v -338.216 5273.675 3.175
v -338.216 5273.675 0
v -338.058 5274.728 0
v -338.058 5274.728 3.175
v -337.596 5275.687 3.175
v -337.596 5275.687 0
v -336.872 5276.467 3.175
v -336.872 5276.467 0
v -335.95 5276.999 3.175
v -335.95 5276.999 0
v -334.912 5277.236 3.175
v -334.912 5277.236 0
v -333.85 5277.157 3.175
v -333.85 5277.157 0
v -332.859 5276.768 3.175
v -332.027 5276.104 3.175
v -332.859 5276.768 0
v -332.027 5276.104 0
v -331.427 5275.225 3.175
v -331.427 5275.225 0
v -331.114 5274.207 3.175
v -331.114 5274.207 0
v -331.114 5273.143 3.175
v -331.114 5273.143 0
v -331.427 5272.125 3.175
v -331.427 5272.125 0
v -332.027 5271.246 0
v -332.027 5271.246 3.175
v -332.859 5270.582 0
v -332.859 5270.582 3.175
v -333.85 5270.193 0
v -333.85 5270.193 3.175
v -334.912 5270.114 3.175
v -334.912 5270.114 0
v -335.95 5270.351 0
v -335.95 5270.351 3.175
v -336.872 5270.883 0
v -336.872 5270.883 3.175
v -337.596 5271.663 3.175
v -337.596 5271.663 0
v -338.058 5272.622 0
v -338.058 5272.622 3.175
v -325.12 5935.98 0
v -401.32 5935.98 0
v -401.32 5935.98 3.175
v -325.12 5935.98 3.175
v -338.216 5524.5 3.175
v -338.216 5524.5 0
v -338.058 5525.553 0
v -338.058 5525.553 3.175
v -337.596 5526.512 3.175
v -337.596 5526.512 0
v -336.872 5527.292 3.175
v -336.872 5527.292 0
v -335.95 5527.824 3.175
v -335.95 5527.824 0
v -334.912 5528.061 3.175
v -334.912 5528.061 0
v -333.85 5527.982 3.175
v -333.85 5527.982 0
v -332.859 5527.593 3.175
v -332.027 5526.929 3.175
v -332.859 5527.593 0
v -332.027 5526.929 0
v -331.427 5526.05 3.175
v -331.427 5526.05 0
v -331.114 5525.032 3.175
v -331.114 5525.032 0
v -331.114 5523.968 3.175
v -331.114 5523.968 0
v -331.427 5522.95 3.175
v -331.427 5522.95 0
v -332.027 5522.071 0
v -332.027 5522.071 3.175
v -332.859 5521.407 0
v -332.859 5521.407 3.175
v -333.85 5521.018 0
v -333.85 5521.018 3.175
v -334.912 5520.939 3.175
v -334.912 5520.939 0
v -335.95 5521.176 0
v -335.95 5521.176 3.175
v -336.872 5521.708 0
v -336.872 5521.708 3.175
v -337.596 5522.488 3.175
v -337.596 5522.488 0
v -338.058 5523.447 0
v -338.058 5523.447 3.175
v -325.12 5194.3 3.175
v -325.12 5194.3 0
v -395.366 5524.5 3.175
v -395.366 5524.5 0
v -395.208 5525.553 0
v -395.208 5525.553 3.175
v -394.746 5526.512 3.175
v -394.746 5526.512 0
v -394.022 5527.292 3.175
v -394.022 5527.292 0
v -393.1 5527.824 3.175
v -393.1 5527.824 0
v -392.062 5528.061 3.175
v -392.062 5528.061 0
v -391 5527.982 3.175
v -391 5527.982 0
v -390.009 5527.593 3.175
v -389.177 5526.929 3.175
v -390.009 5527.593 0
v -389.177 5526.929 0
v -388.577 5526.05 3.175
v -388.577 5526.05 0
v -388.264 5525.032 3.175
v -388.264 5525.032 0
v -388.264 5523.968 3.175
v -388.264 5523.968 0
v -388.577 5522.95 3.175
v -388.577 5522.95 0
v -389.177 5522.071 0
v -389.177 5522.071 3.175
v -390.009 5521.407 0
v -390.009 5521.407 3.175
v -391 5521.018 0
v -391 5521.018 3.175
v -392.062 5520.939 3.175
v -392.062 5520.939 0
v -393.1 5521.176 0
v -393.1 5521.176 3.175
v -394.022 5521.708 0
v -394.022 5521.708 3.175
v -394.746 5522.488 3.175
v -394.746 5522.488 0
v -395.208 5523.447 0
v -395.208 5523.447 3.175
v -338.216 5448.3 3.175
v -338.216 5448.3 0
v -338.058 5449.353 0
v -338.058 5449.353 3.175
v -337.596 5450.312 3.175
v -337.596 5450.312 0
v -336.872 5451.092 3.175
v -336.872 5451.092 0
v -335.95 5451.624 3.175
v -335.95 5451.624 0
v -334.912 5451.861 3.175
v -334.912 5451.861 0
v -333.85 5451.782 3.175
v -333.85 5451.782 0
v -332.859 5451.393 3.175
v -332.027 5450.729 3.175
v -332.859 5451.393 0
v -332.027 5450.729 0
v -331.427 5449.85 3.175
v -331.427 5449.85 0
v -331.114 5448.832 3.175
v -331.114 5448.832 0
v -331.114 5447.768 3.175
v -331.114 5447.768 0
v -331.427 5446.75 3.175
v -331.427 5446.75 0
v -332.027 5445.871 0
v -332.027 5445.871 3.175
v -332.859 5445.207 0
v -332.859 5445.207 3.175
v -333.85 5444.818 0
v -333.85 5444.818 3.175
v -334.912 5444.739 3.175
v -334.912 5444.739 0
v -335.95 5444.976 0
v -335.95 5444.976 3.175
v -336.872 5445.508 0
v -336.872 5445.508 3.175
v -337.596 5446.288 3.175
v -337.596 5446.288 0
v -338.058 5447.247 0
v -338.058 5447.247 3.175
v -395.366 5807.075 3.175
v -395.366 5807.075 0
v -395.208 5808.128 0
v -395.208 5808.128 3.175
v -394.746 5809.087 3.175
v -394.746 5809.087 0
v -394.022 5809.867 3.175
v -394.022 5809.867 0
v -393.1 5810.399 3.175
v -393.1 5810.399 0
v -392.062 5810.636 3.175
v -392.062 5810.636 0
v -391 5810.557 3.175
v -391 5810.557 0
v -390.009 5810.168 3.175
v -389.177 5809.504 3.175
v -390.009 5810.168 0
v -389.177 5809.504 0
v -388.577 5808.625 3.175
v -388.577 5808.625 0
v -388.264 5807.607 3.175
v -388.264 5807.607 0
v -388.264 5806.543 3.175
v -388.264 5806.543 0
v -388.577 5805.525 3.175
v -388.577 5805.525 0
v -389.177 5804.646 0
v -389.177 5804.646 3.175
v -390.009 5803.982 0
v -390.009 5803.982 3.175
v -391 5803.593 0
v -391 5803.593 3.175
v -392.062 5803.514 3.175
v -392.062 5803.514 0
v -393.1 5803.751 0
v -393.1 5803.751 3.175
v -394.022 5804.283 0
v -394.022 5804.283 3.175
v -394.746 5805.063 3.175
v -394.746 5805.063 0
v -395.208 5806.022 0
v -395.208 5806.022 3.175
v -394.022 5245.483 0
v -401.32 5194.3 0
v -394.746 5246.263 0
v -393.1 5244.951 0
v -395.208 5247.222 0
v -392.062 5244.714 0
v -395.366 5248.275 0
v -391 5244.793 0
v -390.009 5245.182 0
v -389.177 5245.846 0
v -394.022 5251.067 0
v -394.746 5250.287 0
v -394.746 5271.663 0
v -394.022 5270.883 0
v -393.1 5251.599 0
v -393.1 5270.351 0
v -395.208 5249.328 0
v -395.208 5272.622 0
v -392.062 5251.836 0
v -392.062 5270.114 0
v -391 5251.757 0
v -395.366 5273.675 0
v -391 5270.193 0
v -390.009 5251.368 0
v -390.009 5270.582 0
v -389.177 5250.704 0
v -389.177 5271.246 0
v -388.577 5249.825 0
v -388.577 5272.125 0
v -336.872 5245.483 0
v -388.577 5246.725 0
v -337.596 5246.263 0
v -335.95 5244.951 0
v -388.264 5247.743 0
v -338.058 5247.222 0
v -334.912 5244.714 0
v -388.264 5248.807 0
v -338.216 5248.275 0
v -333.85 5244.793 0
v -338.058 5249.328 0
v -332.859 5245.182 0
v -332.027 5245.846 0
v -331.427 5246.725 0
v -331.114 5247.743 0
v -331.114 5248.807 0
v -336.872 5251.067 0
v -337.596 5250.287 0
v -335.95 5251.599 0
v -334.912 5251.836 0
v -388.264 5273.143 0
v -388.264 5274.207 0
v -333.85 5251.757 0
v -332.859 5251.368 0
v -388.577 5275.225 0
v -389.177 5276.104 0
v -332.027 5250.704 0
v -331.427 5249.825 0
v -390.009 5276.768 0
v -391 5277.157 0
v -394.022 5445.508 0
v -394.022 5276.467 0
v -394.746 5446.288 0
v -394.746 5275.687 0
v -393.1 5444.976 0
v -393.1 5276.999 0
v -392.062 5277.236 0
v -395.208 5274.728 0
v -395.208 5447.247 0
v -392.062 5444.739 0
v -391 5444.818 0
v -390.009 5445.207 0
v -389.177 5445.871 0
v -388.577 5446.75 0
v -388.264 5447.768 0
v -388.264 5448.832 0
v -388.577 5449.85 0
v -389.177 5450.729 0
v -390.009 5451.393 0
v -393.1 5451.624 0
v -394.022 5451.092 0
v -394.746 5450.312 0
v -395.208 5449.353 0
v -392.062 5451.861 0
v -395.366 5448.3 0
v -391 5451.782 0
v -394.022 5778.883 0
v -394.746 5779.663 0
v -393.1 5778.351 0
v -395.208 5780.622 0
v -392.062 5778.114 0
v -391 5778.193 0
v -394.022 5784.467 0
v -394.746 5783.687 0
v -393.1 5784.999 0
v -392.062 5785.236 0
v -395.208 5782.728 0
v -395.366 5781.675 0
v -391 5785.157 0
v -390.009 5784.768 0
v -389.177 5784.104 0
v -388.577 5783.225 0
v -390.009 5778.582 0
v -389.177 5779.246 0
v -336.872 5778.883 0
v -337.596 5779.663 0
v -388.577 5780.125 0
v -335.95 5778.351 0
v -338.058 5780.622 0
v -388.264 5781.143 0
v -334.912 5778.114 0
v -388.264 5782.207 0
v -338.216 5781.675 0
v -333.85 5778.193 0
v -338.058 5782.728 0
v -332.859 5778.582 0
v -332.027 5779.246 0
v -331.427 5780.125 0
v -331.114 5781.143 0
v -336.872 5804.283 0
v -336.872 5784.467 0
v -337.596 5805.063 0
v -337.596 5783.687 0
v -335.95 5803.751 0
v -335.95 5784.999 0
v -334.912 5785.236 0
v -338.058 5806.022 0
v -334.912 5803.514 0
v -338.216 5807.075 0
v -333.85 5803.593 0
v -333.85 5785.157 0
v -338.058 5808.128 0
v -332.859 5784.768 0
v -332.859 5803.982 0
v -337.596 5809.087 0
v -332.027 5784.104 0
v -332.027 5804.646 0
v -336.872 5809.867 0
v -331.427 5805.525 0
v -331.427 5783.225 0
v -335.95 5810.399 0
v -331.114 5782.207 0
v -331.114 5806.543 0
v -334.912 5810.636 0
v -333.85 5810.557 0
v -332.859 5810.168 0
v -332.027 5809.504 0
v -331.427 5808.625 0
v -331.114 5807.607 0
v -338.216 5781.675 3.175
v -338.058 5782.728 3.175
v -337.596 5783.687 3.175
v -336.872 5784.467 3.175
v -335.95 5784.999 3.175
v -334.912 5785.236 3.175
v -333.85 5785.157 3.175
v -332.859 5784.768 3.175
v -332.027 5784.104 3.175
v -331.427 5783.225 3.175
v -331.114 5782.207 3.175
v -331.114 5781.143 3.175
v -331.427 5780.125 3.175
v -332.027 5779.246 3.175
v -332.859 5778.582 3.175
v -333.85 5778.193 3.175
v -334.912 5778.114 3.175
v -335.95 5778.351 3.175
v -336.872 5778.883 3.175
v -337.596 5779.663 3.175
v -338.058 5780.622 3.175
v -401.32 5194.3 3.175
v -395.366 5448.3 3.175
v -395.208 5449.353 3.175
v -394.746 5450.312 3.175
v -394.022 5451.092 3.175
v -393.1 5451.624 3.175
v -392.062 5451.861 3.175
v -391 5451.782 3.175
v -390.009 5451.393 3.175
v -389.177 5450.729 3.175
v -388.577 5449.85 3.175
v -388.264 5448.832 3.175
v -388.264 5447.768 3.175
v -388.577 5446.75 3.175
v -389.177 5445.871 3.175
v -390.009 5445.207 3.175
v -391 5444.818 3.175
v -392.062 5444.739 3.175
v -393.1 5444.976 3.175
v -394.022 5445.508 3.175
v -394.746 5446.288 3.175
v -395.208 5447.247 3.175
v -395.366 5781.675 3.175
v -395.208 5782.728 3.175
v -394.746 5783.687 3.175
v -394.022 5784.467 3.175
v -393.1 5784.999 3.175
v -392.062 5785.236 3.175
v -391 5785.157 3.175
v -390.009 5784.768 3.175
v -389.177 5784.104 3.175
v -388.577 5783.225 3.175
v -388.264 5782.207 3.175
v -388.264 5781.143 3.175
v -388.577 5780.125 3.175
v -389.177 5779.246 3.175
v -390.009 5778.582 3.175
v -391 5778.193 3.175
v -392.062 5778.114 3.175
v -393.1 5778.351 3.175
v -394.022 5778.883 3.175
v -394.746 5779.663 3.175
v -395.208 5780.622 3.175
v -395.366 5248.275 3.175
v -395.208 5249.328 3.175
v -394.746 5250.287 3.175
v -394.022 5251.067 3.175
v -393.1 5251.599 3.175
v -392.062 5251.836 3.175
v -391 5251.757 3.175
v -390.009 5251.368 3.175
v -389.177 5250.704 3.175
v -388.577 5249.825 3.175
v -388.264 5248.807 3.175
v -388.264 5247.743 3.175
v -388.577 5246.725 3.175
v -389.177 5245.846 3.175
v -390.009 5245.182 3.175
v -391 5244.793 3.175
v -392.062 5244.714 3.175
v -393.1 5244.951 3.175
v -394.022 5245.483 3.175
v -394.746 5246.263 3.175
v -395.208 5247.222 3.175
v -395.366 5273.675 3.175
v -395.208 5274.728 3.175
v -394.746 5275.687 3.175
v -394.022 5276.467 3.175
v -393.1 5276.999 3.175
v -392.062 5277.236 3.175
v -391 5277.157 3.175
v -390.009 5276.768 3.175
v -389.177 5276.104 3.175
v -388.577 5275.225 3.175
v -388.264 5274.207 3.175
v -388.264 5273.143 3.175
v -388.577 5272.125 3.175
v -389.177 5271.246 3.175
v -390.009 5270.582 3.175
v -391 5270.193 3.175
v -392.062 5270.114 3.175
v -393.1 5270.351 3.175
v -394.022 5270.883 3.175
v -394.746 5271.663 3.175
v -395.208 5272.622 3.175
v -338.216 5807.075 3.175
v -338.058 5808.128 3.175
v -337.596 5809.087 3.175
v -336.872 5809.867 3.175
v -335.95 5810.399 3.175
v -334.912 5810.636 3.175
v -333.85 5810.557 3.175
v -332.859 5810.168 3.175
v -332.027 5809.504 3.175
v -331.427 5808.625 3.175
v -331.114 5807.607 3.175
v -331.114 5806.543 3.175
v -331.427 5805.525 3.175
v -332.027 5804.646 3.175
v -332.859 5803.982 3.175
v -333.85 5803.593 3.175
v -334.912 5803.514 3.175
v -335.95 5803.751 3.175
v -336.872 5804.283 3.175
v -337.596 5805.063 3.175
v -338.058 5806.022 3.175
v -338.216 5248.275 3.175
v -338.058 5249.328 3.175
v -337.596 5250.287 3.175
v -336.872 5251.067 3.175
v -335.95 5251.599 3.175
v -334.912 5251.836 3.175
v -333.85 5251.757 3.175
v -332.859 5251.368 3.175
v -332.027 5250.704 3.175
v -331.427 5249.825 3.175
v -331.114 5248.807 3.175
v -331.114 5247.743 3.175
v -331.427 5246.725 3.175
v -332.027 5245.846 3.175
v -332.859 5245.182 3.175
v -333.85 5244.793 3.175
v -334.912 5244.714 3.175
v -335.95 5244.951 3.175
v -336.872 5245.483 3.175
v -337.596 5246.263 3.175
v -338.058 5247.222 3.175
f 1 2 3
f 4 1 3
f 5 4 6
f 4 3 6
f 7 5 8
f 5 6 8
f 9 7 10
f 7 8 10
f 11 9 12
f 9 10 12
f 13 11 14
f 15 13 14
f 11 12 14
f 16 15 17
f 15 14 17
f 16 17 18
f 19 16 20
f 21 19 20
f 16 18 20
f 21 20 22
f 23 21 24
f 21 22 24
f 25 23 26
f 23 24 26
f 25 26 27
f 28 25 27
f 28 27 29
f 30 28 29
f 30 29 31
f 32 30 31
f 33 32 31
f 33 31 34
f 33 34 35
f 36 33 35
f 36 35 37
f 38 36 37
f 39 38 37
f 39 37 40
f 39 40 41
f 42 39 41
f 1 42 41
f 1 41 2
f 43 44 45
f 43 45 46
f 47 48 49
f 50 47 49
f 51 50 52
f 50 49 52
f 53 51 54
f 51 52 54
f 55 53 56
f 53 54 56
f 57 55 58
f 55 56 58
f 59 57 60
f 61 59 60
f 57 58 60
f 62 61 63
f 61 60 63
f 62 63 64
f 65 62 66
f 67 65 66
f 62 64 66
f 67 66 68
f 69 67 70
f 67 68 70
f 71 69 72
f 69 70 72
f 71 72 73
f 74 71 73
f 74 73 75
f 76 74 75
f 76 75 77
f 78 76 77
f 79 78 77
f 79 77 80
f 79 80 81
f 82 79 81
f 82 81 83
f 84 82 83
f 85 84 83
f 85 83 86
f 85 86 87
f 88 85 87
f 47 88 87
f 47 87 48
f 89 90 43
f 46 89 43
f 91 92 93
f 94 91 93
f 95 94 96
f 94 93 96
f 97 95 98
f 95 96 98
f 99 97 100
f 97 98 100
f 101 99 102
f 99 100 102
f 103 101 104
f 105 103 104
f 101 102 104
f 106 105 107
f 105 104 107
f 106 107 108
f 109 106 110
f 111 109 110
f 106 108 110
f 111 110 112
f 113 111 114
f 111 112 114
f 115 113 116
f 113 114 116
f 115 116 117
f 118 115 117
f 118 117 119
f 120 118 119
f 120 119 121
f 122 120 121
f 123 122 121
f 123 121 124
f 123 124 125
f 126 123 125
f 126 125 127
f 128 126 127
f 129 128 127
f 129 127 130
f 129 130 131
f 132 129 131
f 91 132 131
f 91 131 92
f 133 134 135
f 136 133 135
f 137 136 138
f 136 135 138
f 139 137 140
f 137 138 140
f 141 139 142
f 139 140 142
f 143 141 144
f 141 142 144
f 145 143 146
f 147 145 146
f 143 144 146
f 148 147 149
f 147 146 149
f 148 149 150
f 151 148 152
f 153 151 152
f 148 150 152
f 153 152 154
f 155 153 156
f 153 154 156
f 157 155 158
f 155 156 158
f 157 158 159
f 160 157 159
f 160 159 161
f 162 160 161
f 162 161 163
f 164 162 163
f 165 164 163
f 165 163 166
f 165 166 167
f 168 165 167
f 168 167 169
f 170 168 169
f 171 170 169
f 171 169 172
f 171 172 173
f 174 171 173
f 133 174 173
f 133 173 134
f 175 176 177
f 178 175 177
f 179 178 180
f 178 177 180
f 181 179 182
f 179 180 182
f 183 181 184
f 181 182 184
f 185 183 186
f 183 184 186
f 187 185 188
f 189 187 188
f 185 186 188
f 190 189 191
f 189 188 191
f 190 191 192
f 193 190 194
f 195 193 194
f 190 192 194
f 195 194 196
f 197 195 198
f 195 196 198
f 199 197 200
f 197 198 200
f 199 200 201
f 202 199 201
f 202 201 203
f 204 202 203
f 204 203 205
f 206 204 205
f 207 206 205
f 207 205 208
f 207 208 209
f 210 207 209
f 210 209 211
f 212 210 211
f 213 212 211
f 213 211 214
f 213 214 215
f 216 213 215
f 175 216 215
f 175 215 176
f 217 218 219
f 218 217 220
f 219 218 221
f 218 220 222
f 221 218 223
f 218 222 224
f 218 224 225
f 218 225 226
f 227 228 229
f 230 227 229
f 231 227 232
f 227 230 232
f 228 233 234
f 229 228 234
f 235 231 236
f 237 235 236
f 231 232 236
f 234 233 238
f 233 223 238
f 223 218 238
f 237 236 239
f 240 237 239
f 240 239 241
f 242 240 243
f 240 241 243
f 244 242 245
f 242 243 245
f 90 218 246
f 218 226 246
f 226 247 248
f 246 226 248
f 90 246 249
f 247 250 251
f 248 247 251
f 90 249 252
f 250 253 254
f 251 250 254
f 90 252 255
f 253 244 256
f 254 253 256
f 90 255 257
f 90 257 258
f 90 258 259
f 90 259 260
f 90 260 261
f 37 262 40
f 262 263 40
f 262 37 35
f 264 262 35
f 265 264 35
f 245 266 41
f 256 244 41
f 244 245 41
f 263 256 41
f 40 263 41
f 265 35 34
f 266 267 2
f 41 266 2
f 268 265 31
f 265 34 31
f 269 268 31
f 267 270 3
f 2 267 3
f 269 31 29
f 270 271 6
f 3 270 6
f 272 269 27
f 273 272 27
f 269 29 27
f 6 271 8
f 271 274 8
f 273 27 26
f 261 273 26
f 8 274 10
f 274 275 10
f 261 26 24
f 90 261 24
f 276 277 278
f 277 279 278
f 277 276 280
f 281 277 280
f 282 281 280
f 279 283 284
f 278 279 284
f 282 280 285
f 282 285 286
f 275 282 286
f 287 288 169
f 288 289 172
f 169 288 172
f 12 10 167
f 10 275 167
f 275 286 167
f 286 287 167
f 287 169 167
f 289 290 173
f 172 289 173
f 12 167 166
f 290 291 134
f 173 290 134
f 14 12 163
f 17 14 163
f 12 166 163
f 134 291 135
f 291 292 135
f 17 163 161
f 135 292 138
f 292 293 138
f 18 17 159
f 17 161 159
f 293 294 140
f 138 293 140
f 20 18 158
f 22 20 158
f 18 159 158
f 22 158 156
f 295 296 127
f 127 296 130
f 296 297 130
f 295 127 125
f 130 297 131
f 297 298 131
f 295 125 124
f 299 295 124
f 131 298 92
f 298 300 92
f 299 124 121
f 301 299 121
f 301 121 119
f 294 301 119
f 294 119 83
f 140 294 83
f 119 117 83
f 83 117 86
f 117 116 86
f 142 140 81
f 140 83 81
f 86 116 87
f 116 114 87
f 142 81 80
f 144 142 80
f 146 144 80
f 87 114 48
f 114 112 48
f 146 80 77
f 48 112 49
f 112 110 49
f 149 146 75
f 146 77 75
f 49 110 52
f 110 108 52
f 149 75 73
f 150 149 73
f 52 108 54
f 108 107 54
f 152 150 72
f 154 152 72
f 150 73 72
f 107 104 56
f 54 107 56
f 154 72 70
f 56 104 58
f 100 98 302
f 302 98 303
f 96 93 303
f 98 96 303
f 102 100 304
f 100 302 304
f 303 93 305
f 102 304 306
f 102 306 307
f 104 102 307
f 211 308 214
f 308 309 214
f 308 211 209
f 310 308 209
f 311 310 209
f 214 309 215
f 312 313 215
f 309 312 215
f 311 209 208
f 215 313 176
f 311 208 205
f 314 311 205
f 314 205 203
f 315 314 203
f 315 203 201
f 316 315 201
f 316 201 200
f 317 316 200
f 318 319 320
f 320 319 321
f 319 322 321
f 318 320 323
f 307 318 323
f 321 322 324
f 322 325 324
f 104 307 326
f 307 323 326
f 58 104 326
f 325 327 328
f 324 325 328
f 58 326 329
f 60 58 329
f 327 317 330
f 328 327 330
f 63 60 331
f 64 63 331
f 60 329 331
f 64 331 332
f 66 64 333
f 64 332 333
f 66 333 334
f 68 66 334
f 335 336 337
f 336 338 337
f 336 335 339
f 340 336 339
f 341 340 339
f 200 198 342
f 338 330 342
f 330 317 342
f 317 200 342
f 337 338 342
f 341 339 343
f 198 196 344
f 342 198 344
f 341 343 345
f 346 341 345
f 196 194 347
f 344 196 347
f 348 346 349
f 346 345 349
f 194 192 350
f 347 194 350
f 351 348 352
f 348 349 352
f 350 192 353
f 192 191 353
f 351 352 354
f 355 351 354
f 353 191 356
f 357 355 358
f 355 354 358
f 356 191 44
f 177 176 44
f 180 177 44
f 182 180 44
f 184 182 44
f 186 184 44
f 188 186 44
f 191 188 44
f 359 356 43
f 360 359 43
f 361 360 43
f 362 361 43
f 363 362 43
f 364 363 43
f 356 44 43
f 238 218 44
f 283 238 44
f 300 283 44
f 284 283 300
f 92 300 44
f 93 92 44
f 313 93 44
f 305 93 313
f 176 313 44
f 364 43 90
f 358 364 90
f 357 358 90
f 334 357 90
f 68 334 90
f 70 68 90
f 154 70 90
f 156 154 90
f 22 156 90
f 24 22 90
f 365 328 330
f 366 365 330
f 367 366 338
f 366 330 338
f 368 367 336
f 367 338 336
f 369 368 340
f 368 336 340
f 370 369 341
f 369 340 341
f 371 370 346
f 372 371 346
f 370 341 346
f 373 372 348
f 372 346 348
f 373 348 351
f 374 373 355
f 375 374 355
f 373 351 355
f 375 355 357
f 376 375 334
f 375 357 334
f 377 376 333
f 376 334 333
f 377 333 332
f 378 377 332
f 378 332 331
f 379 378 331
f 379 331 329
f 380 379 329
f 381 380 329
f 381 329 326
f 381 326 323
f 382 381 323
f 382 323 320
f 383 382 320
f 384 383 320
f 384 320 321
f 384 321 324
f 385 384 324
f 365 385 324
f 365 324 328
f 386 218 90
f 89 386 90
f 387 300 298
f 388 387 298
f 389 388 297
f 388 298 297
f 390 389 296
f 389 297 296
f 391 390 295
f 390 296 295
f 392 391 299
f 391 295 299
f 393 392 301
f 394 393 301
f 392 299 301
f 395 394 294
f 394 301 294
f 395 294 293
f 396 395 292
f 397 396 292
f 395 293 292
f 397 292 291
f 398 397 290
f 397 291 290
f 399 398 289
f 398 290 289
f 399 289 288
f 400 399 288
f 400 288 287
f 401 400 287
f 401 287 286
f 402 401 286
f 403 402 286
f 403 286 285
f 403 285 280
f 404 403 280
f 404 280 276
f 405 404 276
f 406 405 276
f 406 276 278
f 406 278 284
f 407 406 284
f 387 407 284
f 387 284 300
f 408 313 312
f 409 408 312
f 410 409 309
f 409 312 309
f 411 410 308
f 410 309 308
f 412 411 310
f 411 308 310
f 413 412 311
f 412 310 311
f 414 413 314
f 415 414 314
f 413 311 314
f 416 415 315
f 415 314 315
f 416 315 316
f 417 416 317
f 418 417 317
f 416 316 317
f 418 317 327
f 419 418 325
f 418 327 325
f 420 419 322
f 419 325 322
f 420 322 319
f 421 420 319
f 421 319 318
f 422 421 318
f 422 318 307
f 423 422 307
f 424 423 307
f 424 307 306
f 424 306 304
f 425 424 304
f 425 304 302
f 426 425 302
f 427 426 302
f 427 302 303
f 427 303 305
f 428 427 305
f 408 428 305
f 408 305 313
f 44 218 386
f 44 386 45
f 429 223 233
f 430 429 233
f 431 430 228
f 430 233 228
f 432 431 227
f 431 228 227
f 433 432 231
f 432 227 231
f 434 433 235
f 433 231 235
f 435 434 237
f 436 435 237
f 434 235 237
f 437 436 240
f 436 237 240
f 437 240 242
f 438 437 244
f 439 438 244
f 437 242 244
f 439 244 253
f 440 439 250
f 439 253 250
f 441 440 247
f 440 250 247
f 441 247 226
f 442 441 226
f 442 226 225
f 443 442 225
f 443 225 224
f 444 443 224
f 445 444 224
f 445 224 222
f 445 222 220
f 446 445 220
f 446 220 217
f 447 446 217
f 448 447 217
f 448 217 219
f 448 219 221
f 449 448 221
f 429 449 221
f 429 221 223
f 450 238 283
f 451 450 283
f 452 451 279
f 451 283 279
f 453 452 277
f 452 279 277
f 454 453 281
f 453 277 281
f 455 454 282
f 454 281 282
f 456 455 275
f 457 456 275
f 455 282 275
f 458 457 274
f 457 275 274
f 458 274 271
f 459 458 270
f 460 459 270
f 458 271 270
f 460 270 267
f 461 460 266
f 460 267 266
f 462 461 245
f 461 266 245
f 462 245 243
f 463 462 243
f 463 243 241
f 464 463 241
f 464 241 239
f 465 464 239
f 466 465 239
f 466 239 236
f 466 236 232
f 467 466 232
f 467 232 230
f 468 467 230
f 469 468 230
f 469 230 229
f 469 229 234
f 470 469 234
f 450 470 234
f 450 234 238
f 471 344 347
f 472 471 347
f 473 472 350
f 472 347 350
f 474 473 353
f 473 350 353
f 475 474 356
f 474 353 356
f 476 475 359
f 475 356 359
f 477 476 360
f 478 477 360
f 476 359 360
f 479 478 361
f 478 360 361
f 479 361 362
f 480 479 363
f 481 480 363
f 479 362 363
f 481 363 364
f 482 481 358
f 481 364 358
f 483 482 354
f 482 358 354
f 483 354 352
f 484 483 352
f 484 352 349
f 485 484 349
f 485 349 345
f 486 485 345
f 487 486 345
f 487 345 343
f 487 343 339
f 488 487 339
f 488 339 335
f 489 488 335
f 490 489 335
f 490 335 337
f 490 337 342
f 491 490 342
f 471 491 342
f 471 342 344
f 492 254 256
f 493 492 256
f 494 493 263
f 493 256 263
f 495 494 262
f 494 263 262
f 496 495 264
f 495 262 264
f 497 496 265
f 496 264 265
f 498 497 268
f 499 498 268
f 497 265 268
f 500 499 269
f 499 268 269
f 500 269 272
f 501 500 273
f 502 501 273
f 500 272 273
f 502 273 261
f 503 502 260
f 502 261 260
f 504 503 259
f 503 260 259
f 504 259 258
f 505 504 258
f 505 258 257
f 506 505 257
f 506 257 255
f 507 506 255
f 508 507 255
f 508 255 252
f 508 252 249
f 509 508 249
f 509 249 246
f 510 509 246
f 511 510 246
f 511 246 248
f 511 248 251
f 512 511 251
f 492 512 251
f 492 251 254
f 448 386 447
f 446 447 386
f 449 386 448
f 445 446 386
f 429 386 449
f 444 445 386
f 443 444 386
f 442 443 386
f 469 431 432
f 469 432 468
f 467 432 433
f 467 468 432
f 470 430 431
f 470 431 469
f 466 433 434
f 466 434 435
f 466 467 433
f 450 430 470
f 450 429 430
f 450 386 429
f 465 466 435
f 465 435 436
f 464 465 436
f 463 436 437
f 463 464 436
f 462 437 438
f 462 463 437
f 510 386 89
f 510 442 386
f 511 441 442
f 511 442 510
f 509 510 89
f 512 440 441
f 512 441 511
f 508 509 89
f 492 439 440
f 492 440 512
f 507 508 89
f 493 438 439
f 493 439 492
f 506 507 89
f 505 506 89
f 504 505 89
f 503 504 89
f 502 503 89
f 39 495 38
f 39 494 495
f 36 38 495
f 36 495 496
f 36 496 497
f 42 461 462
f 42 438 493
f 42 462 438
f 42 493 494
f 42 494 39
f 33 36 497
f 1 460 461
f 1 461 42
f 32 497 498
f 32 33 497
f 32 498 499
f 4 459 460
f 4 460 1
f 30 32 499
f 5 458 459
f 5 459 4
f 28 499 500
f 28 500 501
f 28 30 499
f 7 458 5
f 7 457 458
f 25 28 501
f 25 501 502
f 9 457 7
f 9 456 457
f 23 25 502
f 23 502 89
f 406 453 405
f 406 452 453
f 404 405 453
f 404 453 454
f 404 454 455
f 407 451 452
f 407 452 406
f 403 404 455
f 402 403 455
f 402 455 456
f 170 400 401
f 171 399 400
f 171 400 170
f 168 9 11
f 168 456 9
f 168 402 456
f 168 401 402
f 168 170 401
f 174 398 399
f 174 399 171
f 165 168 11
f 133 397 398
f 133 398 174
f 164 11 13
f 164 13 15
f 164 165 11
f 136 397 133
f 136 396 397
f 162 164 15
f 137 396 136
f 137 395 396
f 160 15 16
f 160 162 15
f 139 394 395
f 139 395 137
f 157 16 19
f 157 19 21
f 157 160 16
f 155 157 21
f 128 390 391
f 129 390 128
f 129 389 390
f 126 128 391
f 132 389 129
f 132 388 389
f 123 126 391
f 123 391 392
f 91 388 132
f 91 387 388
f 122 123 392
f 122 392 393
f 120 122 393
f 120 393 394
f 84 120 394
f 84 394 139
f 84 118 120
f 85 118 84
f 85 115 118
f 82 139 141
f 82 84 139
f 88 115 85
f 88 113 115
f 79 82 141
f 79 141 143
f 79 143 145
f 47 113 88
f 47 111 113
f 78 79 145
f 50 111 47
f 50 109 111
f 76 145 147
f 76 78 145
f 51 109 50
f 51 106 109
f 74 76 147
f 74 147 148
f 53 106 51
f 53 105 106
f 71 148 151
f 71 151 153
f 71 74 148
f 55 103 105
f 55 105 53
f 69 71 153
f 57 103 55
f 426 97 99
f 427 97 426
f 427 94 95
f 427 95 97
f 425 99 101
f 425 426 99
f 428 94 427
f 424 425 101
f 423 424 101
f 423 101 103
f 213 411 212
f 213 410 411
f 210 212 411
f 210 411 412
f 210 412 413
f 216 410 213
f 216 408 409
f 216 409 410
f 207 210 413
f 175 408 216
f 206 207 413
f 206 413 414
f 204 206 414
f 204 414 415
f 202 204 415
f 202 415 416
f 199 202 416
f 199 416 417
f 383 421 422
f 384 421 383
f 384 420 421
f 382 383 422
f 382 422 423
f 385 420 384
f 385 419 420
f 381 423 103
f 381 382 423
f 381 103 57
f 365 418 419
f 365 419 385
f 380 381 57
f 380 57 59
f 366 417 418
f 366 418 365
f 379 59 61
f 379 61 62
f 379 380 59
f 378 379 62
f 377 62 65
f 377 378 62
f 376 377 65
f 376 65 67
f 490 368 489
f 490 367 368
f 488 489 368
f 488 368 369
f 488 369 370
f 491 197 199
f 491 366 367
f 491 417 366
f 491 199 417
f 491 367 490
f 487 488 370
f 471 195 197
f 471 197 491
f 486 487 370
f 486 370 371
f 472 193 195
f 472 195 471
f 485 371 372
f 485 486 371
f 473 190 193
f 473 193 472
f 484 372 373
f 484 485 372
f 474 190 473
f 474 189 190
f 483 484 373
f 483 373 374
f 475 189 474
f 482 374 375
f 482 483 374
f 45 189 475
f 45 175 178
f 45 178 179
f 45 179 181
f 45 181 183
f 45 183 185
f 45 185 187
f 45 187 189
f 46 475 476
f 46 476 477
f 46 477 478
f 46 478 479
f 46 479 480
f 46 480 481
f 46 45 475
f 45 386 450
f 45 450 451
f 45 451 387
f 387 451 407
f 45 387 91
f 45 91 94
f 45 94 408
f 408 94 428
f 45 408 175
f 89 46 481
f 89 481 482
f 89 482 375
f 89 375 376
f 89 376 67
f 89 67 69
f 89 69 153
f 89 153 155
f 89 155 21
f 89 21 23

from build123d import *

# Parameters (mm, degrees)
SKETCH1_W                   = 76.2
SKETCH1_H                   = 741.680000144
BOSS_EXTRUDE1_DEPTH         = 3.175
F_1_4_CLEARANCE_HOLE1_D     = 7.14248
F_1_4_CLEARANCE_HOLE1_DEPTH = 50.8
F_1_4_CLEARANCE_HOLE1_TIP   = 2.145817477


with BuildPart() as part:
    # Sketch1 → Boss-Extrude1 (new body)
    with BuildSketch(Plane.XY):
        with Locations((-363.22, 5565.140000072)):
            Rectangle(SKETCH1_W, SKETCH1_H)
    extrude(amount=BOSS_EXTRUDE1_DEPTH)

    # 1/4 Clearance Hole1
    with Locations(Plane.XY.offset(3.175)):
        with Locations((-391.795, 5248.275), (-391.795, 5273.675), (-334.645, 5273.675), (-334.645, 5248.275), (-334.645, 5781.675), (-334.645, 5807.075), (-391.795, 5807.075), (-391.795, 5781.675), (-391.795, 5448.3), (-334.645, 5448.3), (-391.795, 5524.5), (-334.645, 5524.5), (334.645, 5524.5), (391.795, 5524.5), (334.645, 5448.3), (391.795, 5448.3), (391.795, 5781.675), (391.795, 5807.075), (334.645, 5807.075), (334.645, 5781.675), (334.645, 5248.275), (334.645, 5273.675), (391.795, 5273.675), (391.795, 5248.275)):
            Hole(F_1_4_CLEARANCE_HOLE1_D / 2, depth=F_1_4_CLEARANCE_HOLE1_DEPTH)
            with Locations((0, 0, -(F_1_4_CLEARANCE_HOLE1_DEPTH + F_1_4_CLEARANCE_HOLE1_TIP / 2))):  # 118° drill point
                Cone(0, F_1_4_CLEARANCE_HOLE1_D / 2, F_1_4_CLEARANCE_HOLE1_TIP, mode=Mode.SUBTRACT)


solid = part.part
